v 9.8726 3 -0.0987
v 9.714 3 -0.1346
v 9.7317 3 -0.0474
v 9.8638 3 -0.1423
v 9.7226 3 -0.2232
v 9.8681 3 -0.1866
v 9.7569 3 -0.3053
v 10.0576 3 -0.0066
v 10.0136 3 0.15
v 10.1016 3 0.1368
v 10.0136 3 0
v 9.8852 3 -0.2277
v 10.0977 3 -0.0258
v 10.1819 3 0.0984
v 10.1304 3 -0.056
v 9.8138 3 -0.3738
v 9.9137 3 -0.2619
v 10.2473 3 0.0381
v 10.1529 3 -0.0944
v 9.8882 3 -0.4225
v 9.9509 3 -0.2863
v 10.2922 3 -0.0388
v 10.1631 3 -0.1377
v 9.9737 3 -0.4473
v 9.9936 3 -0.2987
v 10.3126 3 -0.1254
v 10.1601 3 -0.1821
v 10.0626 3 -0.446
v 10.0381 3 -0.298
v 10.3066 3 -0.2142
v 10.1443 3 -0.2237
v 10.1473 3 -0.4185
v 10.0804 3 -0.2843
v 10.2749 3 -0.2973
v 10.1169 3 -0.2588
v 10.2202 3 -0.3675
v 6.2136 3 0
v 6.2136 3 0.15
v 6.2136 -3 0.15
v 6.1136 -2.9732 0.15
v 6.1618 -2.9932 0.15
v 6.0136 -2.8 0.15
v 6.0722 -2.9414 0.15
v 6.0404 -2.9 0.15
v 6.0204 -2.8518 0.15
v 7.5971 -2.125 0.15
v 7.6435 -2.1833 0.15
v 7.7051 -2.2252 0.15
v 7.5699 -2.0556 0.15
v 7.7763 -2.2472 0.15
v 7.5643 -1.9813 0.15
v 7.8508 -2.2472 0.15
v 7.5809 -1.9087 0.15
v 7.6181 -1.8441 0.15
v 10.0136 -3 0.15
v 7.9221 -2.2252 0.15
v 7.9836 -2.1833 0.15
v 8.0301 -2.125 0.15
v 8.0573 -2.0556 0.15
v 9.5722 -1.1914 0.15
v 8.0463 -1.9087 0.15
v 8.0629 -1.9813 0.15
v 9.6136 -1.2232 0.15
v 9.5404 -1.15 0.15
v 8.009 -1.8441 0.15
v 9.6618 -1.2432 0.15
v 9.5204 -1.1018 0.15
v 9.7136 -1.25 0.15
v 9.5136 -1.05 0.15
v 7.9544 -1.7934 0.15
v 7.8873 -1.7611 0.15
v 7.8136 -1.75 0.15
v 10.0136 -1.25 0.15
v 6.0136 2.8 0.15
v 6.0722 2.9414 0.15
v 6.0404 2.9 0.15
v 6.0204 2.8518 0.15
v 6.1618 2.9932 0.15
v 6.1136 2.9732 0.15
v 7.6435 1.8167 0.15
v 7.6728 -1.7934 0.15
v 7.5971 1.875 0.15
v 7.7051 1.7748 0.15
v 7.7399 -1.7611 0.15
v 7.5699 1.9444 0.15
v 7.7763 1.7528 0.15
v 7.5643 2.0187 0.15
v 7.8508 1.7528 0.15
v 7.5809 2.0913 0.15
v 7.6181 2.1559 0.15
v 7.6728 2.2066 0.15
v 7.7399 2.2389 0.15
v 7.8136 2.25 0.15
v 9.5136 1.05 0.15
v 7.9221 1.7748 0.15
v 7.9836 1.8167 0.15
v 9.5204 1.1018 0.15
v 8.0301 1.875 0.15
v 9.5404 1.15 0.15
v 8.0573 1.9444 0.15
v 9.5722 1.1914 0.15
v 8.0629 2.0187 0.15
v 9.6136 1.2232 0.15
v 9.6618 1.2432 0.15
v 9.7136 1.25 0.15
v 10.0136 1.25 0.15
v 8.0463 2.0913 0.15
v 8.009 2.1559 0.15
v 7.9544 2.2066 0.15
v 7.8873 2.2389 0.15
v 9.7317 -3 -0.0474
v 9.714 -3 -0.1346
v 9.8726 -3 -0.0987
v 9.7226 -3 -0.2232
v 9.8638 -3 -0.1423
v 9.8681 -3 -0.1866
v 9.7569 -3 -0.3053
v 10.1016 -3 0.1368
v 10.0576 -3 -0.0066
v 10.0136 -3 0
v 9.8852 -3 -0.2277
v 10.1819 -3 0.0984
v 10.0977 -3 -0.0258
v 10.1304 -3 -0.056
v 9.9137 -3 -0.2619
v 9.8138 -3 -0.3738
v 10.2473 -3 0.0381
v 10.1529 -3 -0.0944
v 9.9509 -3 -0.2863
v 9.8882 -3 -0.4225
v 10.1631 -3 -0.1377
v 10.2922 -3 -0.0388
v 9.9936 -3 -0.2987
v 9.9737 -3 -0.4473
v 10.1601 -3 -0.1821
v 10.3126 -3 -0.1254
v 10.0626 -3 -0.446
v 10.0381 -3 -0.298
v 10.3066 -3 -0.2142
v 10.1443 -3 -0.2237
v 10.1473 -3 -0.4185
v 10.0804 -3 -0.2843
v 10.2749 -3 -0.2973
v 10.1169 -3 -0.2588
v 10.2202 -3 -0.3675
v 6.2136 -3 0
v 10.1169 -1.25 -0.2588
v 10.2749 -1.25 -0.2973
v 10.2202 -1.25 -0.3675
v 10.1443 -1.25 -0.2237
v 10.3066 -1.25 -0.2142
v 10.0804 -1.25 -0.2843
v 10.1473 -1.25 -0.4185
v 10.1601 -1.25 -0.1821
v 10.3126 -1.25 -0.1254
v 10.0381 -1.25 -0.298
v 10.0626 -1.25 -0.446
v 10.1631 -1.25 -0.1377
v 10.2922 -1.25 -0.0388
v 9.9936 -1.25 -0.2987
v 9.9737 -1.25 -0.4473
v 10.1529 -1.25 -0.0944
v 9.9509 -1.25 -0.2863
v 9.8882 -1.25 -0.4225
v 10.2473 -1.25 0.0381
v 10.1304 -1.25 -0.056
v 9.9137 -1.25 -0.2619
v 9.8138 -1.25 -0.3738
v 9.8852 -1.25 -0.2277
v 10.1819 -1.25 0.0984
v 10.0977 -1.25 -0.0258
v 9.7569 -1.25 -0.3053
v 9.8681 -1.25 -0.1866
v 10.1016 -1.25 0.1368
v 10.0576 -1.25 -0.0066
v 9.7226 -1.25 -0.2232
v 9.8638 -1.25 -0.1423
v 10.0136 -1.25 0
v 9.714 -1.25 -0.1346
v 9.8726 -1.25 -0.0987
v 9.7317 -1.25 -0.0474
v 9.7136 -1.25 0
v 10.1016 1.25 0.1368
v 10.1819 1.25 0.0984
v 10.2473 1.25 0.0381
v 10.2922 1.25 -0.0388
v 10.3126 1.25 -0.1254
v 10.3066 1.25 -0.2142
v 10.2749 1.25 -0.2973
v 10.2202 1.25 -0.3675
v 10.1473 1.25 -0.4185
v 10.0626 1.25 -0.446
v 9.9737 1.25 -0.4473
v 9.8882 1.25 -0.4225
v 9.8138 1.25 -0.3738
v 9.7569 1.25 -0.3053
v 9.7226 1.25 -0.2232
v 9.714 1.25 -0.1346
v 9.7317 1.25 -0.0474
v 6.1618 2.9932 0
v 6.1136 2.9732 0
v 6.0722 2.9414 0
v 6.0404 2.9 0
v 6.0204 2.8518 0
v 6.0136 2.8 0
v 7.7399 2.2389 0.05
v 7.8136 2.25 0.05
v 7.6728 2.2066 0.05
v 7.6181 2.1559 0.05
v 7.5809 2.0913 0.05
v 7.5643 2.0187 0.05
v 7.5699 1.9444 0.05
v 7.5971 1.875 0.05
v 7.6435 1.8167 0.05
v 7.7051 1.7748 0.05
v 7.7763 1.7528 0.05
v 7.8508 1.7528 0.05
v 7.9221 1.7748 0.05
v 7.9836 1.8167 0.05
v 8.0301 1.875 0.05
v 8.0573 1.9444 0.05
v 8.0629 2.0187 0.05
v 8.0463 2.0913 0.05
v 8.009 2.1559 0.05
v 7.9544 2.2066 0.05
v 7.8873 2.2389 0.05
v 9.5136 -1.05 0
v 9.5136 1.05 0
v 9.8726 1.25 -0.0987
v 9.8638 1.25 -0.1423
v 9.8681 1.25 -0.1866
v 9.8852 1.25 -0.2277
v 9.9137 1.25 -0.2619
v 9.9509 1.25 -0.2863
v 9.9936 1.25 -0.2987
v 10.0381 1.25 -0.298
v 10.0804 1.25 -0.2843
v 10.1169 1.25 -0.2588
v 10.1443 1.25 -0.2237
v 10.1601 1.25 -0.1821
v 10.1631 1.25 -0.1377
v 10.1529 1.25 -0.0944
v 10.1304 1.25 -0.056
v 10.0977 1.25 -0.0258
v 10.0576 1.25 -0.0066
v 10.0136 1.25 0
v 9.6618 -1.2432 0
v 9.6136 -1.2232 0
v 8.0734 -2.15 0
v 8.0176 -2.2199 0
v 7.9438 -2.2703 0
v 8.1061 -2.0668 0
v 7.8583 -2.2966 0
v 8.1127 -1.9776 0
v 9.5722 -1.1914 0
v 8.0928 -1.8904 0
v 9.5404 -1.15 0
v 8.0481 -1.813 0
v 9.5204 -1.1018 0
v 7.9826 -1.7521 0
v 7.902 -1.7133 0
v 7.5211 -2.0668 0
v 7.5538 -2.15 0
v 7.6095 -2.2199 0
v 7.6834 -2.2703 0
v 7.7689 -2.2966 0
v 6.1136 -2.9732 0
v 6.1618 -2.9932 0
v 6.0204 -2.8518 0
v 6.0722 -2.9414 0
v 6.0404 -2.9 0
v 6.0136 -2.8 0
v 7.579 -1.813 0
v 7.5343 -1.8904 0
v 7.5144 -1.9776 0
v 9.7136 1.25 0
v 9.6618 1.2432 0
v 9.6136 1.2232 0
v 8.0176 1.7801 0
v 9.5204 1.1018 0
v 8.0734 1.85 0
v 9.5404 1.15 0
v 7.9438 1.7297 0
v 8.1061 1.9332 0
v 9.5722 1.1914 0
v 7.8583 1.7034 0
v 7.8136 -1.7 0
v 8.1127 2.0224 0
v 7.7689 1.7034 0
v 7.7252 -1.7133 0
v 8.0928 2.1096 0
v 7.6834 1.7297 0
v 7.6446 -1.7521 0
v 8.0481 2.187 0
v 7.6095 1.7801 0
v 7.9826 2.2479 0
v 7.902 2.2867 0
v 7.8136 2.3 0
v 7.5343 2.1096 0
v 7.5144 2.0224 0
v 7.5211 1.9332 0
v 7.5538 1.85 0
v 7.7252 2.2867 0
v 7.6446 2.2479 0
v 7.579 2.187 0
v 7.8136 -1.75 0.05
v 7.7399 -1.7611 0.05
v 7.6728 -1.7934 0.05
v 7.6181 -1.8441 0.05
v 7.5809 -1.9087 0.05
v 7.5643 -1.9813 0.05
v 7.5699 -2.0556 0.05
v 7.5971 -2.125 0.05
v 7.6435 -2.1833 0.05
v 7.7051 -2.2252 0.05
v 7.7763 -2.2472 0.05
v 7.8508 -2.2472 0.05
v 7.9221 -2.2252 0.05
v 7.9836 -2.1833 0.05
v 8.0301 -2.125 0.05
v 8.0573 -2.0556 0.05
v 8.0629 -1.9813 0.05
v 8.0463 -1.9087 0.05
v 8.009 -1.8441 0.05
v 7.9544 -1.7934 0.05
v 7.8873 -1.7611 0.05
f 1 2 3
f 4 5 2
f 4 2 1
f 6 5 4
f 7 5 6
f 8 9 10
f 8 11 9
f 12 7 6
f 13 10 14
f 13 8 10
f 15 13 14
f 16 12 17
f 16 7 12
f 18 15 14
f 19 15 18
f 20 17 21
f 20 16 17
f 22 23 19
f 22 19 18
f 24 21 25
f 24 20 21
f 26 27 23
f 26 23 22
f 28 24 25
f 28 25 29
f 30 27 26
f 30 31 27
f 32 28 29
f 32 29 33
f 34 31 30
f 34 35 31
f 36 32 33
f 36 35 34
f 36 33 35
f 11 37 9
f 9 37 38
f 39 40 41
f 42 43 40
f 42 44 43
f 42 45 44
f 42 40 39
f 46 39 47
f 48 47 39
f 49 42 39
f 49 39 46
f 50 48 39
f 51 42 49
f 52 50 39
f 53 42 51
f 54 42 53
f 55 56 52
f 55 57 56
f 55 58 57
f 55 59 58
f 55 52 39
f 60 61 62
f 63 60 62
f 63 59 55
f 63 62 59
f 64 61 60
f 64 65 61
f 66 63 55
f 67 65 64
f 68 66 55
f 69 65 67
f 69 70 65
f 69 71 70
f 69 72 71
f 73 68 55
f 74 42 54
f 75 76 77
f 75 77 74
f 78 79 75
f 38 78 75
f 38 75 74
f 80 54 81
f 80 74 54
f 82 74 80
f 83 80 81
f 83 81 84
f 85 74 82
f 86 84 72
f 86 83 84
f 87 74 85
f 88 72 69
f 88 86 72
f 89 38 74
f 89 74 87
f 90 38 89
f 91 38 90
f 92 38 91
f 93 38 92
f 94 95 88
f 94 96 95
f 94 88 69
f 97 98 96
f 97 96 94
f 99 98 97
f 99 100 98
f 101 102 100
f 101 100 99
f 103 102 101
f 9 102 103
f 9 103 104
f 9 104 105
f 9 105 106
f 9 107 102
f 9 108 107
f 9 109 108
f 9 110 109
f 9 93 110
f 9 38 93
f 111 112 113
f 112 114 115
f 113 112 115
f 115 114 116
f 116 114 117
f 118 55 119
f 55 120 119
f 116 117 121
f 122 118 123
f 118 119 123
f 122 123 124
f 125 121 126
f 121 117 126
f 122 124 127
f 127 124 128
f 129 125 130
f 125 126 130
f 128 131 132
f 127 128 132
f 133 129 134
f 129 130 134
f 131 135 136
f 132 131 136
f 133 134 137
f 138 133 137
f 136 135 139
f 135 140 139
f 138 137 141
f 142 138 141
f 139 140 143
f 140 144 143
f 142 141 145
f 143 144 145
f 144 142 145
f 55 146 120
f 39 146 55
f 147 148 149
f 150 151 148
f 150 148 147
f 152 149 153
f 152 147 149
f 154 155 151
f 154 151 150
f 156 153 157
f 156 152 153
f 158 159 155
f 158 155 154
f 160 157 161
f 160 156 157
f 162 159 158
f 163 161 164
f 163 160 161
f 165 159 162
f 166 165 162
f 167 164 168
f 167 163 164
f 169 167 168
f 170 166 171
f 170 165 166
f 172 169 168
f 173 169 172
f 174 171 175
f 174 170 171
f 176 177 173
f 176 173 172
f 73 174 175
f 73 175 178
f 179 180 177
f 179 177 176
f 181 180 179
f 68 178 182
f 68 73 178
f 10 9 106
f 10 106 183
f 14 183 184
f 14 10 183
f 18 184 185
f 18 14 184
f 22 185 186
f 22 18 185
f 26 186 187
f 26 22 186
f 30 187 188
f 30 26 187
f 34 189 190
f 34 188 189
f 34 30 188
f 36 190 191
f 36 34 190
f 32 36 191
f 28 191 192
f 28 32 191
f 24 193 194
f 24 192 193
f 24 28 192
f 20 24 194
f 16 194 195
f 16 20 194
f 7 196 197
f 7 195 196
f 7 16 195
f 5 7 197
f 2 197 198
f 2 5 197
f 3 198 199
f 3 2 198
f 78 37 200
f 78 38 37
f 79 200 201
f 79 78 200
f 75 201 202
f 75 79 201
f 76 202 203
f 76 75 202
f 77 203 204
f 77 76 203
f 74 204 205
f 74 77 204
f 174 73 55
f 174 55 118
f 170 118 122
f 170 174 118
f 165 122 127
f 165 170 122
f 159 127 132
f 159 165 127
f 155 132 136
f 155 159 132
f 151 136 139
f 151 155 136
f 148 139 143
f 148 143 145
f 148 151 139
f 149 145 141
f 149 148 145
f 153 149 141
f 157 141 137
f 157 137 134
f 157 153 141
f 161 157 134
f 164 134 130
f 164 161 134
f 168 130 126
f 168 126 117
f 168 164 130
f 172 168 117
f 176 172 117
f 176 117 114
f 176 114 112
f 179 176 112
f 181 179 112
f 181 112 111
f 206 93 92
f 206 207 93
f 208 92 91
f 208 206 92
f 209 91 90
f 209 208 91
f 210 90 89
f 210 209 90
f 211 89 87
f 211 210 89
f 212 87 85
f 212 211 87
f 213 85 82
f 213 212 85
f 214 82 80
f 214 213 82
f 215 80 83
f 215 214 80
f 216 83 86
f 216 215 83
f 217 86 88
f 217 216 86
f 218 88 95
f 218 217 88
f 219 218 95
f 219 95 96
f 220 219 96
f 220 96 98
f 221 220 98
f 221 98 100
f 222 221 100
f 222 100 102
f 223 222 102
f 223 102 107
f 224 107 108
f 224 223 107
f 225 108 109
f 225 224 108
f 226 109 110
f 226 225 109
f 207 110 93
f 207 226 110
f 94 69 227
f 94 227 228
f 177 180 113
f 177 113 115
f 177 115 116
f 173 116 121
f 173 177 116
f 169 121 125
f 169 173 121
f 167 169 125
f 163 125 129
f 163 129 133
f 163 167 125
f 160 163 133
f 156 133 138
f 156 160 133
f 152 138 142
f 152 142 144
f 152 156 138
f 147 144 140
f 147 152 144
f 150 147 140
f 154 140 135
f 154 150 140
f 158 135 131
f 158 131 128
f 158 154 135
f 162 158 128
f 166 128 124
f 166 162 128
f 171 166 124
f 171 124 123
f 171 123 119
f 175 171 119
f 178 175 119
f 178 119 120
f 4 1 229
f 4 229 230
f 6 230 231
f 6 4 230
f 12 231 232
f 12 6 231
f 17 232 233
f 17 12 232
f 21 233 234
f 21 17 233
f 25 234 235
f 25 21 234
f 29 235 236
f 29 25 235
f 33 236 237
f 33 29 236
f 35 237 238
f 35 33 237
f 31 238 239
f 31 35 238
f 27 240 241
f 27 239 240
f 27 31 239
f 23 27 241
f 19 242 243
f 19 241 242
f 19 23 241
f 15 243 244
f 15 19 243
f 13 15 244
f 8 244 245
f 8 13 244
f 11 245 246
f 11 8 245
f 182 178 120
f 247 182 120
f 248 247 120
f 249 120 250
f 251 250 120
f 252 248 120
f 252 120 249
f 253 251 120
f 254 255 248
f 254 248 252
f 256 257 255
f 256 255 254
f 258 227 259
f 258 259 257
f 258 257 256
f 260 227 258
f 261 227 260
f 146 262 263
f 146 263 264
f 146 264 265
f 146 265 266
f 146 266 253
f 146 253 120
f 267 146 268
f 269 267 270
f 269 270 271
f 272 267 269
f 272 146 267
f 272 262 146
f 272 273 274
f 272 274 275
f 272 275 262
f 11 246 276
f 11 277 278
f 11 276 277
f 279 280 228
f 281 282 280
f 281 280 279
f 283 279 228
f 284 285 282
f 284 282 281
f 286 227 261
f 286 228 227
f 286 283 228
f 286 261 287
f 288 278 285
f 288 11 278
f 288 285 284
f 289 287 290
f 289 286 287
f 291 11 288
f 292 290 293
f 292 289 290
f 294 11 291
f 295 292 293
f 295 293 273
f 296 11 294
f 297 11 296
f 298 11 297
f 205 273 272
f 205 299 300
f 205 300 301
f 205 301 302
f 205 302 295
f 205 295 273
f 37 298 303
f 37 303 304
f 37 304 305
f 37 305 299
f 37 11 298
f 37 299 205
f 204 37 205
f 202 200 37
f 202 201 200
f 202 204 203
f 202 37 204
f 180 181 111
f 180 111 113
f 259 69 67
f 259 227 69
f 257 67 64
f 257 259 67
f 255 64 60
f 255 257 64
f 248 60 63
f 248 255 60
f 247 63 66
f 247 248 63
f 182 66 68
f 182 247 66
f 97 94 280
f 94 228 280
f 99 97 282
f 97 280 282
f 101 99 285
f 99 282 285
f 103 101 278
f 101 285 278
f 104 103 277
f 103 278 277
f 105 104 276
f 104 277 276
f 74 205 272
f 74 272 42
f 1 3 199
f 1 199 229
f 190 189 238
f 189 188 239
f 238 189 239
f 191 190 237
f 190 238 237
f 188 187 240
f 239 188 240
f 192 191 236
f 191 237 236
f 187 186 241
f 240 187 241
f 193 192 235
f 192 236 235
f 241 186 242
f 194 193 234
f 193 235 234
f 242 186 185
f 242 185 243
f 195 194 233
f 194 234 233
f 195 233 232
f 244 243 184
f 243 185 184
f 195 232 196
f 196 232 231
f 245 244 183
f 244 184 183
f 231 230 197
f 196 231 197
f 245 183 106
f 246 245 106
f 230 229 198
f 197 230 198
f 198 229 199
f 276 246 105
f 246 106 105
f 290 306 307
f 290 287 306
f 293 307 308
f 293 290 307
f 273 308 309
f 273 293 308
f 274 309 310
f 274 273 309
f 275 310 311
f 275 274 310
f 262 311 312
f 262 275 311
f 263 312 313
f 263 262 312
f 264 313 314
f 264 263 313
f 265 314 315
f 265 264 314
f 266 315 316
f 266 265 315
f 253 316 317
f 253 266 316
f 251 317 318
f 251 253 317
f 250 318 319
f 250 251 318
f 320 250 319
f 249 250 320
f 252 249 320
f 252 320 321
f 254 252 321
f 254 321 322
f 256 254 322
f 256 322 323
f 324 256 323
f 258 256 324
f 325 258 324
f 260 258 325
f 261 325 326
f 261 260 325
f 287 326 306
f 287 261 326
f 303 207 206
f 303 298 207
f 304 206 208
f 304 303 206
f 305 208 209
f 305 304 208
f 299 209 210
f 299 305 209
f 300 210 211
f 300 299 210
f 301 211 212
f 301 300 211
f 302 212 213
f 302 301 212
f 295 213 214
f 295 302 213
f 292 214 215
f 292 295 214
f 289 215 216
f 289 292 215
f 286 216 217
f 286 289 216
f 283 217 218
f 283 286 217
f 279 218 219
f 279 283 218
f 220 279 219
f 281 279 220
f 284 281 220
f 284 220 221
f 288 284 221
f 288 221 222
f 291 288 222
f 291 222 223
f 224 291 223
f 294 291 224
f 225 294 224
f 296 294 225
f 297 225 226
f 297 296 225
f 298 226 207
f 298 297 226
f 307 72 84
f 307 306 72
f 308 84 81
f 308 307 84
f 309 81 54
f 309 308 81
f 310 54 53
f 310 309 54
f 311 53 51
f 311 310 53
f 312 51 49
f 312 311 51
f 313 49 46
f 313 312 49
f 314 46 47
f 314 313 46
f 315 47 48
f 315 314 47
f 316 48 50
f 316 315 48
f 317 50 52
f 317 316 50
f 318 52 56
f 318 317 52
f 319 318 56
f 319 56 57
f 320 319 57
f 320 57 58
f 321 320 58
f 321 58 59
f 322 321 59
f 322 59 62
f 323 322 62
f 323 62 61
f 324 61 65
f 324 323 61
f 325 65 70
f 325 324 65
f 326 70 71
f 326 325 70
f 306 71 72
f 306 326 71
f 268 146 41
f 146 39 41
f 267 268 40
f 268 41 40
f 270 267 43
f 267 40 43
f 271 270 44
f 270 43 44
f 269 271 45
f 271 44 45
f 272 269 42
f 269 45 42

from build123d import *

# Parameters (mm, degrees)
BASE_FLANGE1_DEPTH                             = 3
CUT_EXTRUDE1_DEPTH                             = 11.75046698
CUT_EXTRUDE1_DEPTH_BACK                        = 11.75046698
SKETCH10_W                                     = 0.8
SKETCH10_H                                     = 2.5
FILLET1_R                                      = 0.2
CSK_FOR_M3_FLAT_HEAD_MACHINE_SCREW1_AT_2_COUNT = 2
CSK_FOR_M3_FLAT_HEAD_MACHINE_SCREW1_AT_2_PITCH = 4


# Sheet-metal steps are written as plain solids
with BuildPart() as part:
    # Sketch5 → Base-Flange1 (new, symmetric)
    with BuildSketch(Plane(origin=(0, 0, 0), x_dir=(1, 0, 0), z_dir=(0, 1, 0))):
        with BuildLine():
            ThreePointArc((9.872631336, 0.098696979), (10.099621695, 0.272872807), (10.013585229, 0))
            Line((10.013585229, 0), (6.013585229, 0))
            Line((6.013585229, 0), (6.013585229, -0.15))
            Line((6.013585229, -0.15), (10.013585229, -0.15))
            ThreePointArc((10.013585229, -0.15), (10.18565816, 0.395745613), (9.731677443, 0.047393957))
            Line((9.731677443, 0.047393957), (9.872631336, 0.098696979))
        make_face()
    extrude(amount=BASE_FLANGE1_DEPTH, both=True)

    # Sketch10 → Cut-Extrude1 (cut, two sides: drawn at the far end of the back side and taken through both)
    with BuildSketch(Plane(origin=(0, 0, 0), x_dir=(-1, 0, 0), z_dir=(0, 0, -1)).offset(-CUT_EXTRUDE1_DEPTH_BACK)):
        with Locations((-9.913585229, 0)):
            Rectangle(SKETCH10_W, SKETCH10_H)
    extrude(amount=CUT_EXTRUDE1_DEPTH + CUT_EXTRUDE1_DEPTH_BACK, mode=Mode.SUBTRACT)

    # Fillet1
    fillet1_edges = [part.edges().sort_by_distance(p)[0] for p in [
        (6.013585229, 3, 0.075),
        (9.513585229, -1.25, 0.075),
        (9.513585229, 1.25, 0.075),
        (6.013585229, -3, 0.075),
    ]]
    fillet(fillet1_edges, radius=FILLET1_R)

    # Sketch13 → CSK for M3 Flat Head Machine Screw1 (revolve, cut)
    with BuildSketch(Plane(origin=(7.813585229, 2, 0), x_dir=(0, 1, 0), z_dir=(1, 0, 0))):
        Polygon((0, 0), (0, 0.15), (0.25, 0.15), (0.25, 0.05), (0.3, 0), align=None)
    csk_for_m3_flat_head_machine_screw1 = revolve(axis=Axis((7.813585229, 2, -6.35), (0, 0, 1)), mode=Mode.SUBTRACT)

    # CSK for M3 Flat Head Machine Screw1 at 2: CSK for M3 Flat Head Machine Screw1 ×2
    with Locations(*[(0, -i * CSK_FOR_M3_FLAT_HEAD_MACHINE_SCREW1_AT_2_PITCH, 0) for i in range(1, CSK_FOR_M3_FLAT_HEAD_MACHINE_SCREW1_AT_2_COUNT)]):
        add(csk_for_m3_flat_head_machine_screw1, mode=Mode.SUBTRACT)


solid = part.part
